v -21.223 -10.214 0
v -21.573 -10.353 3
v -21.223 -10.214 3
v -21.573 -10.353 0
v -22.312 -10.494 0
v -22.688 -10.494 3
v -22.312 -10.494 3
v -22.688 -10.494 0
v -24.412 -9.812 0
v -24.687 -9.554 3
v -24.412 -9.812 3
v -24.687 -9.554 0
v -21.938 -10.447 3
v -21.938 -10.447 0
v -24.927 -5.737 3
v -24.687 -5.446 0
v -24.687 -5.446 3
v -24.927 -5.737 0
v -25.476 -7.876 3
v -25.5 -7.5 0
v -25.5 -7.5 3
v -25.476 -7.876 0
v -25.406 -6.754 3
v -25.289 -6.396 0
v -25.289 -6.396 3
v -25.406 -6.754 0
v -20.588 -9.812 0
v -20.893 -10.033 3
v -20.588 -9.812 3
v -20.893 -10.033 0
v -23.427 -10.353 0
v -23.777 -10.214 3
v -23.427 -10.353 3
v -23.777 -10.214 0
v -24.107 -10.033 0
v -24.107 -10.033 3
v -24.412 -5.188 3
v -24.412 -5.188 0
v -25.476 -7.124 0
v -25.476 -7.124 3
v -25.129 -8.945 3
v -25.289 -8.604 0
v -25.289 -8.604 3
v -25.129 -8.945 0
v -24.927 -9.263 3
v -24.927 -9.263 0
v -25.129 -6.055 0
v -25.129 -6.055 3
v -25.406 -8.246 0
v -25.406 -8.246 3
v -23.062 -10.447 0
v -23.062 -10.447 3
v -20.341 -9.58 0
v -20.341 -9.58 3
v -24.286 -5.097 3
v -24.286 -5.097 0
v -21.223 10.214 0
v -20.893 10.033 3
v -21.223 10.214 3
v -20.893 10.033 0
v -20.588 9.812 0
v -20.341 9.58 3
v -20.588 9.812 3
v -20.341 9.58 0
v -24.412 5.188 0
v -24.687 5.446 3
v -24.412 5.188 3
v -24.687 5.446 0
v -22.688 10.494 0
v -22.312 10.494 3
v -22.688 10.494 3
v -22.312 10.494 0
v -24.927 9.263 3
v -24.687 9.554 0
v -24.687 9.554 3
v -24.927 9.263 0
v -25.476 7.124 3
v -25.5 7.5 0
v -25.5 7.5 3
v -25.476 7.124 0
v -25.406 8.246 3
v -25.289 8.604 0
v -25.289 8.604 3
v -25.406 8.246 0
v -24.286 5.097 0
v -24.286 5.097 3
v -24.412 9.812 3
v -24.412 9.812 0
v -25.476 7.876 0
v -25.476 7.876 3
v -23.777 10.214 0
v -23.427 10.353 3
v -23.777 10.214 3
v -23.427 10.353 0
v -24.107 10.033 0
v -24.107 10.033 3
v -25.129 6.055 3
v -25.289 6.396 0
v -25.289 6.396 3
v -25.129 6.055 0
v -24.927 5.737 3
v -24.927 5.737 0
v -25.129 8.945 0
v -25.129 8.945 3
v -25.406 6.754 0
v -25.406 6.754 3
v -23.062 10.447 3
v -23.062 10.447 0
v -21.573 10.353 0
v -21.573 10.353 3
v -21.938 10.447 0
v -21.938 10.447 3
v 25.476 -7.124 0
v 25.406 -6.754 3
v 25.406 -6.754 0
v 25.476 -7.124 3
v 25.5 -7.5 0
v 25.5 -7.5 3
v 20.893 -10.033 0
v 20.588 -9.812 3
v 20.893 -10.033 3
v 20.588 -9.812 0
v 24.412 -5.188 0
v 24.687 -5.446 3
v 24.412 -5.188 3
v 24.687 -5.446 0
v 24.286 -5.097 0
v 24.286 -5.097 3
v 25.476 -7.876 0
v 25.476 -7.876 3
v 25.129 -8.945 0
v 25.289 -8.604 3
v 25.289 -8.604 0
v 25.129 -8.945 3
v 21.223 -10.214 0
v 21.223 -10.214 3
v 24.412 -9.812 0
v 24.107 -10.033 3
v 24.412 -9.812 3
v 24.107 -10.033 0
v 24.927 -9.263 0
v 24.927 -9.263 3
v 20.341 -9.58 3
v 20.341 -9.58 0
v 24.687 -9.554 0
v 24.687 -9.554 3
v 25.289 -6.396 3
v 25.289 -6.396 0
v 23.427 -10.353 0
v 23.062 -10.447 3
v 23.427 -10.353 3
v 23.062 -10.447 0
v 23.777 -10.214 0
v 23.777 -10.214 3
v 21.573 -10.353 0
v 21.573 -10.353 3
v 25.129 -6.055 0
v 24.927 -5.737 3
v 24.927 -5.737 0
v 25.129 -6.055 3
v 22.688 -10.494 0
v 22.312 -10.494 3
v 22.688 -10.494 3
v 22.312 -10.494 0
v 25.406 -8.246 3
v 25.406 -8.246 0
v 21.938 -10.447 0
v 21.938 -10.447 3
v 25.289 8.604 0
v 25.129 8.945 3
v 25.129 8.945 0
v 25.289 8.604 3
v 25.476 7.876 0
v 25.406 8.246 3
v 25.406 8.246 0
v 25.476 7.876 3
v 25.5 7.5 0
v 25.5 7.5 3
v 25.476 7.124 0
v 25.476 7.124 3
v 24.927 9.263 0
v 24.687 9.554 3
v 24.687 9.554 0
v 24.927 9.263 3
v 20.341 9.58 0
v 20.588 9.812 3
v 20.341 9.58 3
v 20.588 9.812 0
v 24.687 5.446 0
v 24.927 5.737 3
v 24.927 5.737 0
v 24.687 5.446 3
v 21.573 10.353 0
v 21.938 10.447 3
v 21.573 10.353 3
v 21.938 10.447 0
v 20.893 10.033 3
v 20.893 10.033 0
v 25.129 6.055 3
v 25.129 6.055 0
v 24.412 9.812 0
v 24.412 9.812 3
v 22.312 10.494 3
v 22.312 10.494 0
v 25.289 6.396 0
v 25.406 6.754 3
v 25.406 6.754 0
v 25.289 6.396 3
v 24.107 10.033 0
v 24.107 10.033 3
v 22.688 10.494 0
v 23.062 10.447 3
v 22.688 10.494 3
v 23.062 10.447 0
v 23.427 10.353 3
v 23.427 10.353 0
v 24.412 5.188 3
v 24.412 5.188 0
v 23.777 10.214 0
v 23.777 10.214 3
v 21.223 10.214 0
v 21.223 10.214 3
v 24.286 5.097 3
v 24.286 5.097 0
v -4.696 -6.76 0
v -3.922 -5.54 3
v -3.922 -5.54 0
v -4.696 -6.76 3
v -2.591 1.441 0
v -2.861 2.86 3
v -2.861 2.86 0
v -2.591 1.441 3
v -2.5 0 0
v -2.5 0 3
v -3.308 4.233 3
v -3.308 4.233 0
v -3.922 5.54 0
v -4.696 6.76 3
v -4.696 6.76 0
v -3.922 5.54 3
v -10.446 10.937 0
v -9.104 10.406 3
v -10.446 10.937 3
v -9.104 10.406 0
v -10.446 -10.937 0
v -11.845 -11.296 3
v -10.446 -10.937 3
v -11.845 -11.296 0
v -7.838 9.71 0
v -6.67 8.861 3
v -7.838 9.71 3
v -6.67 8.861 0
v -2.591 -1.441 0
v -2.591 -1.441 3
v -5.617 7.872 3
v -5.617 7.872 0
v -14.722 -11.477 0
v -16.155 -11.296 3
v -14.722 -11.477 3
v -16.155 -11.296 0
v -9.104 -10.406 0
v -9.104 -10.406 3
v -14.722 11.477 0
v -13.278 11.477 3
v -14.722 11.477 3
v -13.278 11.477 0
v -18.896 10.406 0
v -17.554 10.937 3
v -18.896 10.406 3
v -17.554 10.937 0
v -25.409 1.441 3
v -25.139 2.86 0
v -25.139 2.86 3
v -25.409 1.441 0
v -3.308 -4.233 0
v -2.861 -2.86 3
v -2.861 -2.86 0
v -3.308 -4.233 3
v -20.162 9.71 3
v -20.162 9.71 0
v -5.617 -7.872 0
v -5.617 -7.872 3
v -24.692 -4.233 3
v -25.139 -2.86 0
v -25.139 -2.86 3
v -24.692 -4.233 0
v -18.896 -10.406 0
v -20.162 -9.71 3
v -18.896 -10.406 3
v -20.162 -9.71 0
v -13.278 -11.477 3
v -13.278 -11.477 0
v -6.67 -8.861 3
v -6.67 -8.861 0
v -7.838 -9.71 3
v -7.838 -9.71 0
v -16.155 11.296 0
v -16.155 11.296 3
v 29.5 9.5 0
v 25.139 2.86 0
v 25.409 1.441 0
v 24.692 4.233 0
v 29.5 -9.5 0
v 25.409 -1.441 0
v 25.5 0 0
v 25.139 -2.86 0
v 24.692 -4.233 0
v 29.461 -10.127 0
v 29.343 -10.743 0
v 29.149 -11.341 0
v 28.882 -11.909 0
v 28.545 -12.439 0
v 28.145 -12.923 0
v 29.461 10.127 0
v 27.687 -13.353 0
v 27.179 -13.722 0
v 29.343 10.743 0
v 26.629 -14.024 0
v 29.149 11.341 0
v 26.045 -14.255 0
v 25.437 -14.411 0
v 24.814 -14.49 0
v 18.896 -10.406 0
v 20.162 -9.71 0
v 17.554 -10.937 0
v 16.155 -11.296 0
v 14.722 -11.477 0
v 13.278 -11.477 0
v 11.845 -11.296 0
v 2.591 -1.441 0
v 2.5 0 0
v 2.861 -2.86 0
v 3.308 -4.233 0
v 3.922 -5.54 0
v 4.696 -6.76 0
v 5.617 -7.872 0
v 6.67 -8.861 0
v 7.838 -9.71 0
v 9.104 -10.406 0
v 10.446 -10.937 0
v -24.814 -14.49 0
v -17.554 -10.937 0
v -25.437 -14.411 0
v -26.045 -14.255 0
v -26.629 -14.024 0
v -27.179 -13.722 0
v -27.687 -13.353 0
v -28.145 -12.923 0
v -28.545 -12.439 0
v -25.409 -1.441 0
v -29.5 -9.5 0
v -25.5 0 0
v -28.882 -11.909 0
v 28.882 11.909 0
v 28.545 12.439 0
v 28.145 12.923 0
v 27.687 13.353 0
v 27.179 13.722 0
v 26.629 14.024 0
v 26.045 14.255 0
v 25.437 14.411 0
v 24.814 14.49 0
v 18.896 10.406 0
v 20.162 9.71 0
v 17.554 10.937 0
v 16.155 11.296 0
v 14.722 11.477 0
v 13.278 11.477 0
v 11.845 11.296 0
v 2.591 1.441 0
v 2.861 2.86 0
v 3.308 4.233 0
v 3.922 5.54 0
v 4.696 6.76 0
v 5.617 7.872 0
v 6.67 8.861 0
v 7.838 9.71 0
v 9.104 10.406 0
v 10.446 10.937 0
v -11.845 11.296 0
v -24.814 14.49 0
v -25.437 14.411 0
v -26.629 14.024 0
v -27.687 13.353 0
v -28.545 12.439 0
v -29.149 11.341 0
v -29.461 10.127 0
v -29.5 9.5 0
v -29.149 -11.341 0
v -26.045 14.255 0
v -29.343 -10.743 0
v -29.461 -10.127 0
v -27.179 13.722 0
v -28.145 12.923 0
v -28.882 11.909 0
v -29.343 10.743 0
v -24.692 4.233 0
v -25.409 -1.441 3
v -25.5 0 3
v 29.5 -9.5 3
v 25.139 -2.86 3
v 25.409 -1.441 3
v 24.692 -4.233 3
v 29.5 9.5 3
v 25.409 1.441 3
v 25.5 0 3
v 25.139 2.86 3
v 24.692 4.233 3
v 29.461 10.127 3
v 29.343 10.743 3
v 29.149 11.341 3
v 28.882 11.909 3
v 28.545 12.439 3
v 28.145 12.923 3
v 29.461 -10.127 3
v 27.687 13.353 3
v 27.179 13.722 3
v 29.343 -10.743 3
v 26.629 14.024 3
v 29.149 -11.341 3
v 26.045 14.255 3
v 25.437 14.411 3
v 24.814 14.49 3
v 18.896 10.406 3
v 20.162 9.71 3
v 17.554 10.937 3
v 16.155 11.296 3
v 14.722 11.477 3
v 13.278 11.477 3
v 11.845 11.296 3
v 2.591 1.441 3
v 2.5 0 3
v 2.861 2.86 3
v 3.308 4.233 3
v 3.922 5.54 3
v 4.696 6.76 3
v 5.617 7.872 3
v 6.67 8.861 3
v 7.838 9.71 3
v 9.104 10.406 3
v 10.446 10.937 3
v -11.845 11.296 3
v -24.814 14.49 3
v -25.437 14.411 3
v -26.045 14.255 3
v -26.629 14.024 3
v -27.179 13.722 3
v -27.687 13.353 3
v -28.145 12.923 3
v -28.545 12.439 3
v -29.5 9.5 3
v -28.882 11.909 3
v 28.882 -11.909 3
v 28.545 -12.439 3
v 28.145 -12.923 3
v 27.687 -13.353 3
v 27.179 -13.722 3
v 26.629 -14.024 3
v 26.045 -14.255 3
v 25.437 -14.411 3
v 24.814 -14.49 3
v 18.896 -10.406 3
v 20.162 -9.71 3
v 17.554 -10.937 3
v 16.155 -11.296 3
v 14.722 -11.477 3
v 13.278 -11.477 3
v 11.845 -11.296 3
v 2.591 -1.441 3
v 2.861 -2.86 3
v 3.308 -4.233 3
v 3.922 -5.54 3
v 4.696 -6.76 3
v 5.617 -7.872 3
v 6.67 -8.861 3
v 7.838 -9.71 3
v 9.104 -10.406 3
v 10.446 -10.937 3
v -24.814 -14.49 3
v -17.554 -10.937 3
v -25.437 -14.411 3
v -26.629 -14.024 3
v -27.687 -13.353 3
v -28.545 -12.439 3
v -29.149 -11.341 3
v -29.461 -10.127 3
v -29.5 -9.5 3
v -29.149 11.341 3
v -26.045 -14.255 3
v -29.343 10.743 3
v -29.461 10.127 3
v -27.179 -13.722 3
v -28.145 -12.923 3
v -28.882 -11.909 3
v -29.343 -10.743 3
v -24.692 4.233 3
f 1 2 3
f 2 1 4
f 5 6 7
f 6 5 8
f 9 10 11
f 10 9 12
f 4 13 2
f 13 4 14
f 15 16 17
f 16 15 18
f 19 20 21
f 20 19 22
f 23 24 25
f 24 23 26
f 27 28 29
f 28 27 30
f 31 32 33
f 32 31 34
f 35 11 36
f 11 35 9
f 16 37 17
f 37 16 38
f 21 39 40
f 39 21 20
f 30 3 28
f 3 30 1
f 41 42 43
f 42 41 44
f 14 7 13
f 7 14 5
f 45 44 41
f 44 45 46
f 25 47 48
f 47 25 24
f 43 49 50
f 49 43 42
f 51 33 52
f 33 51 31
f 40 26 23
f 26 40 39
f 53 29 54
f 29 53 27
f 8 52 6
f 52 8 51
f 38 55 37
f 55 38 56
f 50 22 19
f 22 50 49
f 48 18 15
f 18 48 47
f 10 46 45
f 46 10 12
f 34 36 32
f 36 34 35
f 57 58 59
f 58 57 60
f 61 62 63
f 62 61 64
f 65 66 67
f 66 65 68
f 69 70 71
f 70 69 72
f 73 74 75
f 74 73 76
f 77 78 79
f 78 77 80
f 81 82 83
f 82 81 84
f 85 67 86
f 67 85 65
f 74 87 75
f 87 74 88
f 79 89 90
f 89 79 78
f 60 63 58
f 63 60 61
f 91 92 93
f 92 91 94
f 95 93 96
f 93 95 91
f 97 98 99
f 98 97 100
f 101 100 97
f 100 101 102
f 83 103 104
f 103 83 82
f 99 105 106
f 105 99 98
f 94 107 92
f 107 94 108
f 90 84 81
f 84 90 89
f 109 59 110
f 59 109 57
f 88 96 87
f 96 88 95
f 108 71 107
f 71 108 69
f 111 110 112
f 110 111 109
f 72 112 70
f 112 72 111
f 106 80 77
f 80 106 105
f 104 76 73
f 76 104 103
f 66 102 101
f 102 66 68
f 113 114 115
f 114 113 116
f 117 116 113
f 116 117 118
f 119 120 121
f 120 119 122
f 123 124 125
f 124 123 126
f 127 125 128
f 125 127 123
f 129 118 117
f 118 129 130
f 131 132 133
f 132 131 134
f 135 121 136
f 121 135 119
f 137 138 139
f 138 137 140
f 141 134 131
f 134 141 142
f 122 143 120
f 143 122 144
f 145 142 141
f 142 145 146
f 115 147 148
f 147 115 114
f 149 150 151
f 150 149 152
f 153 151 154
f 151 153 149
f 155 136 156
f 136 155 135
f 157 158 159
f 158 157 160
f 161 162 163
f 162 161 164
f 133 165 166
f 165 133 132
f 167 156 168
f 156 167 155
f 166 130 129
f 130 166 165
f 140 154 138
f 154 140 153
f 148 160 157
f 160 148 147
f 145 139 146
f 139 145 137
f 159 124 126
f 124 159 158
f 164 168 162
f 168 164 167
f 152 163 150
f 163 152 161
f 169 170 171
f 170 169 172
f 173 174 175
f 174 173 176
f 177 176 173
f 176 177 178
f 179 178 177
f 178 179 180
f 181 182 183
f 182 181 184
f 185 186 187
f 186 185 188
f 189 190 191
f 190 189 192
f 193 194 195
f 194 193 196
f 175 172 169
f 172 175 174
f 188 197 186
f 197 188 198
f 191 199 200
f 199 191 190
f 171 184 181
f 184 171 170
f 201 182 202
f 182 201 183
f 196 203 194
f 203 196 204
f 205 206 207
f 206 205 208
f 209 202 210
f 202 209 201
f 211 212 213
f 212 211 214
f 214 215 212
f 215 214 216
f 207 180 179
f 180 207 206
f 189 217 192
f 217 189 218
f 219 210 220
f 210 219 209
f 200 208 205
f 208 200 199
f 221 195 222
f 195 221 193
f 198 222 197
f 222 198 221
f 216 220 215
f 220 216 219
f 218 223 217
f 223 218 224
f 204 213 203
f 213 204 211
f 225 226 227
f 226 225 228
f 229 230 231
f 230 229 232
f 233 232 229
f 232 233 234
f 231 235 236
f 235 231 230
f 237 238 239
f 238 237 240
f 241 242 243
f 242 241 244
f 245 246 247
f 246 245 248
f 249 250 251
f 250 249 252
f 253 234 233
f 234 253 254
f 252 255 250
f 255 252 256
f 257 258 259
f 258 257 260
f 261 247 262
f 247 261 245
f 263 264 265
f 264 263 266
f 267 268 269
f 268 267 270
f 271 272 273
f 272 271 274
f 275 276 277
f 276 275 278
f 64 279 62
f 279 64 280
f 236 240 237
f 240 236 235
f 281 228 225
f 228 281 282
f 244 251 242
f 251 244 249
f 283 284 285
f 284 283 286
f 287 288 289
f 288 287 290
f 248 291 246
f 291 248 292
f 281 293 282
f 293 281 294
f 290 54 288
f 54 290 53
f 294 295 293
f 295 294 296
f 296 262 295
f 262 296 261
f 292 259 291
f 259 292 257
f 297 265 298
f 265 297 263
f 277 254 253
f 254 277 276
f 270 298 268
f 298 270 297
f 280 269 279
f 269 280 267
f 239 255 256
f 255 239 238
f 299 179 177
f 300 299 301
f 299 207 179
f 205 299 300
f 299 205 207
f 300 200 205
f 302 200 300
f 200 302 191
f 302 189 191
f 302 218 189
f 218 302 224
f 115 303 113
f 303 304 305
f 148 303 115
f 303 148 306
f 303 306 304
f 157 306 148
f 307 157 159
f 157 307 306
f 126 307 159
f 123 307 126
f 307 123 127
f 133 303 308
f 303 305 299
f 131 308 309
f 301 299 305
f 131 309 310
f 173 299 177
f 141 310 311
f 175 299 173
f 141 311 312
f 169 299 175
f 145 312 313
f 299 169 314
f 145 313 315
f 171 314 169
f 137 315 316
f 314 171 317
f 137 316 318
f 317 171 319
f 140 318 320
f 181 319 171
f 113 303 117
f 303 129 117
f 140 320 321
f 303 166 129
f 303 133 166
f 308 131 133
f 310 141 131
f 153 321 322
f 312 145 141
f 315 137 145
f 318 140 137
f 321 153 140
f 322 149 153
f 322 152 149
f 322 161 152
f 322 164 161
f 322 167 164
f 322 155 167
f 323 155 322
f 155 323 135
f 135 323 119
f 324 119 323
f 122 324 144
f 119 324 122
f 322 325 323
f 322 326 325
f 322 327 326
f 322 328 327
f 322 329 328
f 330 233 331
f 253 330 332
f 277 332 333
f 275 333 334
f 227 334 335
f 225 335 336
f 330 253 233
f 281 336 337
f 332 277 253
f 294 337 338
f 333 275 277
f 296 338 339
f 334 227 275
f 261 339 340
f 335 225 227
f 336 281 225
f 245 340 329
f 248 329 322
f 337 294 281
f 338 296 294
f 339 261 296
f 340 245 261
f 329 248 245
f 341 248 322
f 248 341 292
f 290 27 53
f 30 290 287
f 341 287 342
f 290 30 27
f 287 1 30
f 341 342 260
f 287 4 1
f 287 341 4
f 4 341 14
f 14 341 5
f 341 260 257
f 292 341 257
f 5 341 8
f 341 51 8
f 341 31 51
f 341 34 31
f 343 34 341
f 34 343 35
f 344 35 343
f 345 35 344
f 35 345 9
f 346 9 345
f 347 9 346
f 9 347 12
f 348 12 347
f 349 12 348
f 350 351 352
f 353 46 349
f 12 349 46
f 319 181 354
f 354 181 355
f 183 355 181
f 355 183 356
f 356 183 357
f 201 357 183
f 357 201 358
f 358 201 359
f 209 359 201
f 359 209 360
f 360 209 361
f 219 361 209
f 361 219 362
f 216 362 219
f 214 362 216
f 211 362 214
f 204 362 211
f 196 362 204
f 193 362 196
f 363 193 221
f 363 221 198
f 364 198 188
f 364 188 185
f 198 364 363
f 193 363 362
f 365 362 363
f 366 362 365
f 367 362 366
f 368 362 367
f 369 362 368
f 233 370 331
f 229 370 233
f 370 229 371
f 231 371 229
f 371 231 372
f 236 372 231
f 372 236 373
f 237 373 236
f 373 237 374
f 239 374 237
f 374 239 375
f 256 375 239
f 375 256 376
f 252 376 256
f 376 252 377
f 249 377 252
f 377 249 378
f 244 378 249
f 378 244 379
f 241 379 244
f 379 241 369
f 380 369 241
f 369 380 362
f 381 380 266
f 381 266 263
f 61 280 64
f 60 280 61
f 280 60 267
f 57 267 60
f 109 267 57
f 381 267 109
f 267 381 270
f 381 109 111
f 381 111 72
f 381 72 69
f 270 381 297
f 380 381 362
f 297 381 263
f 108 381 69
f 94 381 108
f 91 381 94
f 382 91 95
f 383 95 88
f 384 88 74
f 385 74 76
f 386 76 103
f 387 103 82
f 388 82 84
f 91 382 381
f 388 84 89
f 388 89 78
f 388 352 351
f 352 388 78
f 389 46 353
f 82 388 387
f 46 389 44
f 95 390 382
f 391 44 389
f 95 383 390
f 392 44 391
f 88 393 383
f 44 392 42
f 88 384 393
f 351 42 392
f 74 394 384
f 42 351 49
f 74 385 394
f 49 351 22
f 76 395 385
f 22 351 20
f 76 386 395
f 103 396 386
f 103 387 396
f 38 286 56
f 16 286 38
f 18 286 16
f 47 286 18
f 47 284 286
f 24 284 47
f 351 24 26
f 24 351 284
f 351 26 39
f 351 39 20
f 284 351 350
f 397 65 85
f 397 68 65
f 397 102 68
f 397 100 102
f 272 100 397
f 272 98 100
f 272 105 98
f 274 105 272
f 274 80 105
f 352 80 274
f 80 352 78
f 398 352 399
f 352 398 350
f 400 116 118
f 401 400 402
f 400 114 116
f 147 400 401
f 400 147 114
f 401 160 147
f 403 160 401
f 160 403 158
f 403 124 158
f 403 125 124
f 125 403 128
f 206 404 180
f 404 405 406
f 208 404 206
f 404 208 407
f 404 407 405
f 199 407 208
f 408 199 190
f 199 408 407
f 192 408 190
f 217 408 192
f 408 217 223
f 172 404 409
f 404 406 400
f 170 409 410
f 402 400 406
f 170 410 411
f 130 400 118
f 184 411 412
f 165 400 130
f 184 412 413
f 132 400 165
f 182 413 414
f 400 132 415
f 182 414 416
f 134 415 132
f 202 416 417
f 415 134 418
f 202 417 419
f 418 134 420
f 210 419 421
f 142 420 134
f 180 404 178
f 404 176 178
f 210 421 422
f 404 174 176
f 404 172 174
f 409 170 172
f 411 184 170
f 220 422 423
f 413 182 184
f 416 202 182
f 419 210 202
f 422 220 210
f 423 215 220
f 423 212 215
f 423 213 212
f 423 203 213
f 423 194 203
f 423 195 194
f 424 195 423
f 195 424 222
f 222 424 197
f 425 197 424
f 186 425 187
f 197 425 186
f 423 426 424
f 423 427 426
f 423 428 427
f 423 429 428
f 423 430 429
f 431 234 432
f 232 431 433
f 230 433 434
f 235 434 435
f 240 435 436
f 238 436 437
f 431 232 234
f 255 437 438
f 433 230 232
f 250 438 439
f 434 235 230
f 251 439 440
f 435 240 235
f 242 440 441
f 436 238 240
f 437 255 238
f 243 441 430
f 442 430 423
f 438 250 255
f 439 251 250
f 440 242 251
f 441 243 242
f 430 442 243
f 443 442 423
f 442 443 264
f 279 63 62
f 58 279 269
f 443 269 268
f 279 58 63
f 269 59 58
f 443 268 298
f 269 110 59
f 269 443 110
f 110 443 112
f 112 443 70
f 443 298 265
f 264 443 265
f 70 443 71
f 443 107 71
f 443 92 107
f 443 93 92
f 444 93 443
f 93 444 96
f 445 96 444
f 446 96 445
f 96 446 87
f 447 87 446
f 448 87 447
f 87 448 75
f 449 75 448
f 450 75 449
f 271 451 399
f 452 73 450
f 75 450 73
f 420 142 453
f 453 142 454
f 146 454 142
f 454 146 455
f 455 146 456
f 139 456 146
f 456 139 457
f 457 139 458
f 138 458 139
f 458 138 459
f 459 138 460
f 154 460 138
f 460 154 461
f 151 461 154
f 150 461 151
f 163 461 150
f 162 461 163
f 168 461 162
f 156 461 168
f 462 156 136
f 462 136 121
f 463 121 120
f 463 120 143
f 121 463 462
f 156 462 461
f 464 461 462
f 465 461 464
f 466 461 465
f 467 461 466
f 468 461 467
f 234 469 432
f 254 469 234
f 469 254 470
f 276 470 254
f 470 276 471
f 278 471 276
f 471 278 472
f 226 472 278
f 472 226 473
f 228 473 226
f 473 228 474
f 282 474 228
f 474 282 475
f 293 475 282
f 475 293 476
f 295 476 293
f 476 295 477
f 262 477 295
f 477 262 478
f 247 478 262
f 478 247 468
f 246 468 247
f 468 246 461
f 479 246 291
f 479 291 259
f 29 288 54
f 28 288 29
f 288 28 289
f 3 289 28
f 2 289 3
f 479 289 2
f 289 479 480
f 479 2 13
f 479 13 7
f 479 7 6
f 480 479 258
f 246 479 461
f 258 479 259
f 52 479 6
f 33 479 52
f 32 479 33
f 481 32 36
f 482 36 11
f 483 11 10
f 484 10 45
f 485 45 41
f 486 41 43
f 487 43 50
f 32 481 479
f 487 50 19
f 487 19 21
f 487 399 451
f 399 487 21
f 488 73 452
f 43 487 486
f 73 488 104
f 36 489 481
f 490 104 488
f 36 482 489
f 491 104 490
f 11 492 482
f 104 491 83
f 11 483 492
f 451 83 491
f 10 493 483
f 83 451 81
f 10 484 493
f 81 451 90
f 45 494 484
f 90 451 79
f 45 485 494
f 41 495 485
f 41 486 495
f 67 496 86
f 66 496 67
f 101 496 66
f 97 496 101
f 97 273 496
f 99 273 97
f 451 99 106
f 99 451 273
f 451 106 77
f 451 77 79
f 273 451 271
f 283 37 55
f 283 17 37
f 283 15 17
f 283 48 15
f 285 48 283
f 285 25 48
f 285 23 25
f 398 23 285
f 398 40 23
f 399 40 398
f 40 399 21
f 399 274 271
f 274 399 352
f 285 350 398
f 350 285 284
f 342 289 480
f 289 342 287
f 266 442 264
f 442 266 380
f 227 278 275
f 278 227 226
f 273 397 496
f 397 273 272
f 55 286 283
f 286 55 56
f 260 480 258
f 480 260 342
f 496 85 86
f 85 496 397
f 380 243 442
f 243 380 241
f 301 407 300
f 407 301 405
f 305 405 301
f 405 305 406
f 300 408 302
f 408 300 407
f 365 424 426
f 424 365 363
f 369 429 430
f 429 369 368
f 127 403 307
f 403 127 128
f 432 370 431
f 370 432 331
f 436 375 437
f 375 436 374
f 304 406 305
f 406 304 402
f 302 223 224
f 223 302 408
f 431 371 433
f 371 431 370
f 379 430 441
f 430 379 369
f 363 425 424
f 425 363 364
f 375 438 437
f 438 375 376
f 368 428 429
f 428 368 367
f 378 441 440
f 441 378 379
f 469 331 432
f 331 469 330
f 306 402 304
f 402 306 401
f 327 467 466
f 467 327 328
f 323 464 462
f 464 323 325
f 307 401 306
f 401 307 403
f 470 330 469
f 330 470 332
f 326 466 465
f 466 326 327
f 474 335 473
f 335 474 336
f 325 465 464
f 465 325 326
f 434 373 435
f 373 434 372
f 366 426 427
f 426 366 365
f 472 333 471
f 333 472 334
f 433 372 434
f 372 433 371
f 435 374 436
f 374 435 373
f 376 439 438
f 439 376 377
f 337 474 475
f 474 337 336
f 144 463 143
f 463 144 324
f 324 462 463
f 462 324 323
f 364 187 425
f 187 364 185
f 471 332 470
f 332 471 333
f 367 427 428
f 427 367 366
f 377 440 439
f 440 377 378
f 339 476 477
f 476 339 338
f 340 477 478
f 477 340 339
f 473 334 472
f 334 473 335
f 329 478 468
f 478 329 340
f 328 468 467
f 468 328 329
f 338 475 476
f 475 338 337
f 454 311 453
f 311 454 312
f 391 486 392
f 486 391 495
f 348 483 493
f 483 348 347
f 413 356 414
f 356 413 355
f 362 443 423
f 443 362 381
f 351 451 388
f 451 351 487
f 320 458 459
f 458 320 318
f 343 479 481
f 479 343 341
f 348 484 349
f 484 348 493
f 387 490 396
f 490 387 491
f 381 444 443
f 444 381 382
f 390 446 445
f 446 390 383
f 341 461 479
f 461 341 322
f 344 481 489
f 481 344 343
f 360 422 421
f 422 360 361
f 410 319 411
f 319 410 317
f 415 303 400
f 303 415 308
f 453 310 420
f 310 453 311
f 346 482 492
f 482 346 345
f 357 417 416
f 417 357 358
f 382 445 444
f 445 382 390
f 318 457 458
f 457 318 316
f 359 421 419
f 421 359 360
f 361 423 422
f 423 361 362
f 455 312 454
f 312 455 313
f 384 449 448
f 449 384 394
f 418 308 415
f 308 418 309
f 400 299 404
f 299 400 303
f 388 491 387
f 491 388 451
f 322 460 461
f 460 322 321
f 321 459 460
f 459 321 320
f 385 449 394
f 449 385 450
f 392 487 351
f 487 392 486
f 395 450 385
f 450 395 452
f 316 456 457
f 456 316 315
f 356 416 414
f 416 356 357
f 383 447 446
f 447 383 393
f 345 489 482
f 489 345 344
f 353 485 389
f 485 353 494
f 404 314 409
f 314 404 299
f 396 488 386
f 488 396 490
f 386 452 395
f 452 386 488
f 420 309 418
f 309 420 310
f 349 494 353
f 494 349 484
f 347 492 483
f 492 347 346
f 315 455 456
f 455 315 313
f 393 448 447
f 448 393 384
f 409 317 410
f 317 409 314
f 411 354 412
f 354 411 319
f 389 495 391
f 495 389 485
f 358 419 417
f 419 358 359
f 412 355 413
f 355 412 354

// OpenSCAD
$fn = 50;


difference() {
	union() {
		hull() {
			translate(v = [-24.5000000000, 9.5000000000, 0]) {
				cylinder(h = 3, r = 5);
			}
			translate(v = [24.5000000000, 9.5000000000, 0]) {
				cylinder(h = 3, r = 5);
			}
			translate(v = [-24.5000000000, -9.5000000000, 0]) {
				cylinder(h = 3, r = 5);
			}
			translate(v = [24.5000000000, -9.5000000000, 0]) {
				cylinder(h = 3, r = 5);
			}
		}
	}
	union() {
		#translate(v = [-22.5000000000, -7.5000000000, -100.0000000000]) {
			cylinder(h = 200, r = 3.0000000000);
		}
		#translate(v = [-22.5000000000, 7.5000000000, -100.0000000000]) {
			cylinder(h = 200, r = 3.0000000000);
		}
		#translate(v = [22.5000000000, -7.5000000000, -100.0000000000]) {
			cylinder(h = 200, r = 3.0000000000);
		}
		#translate(v = [22.5000000000, 7.5000000000, -100.0000000000]) {
			cylinder(h = 200, r = 3.0000000000);
		}
		#translate(v = [-14.0000000000, 0, 0]) {
			cylinder(h = 3, r = 11.5000000000);
		}
		#translate(v = [14.0000000000, 0, 0]) {
			cylinder(h = 3, r = 11.5000000000);
		}
	}
}
